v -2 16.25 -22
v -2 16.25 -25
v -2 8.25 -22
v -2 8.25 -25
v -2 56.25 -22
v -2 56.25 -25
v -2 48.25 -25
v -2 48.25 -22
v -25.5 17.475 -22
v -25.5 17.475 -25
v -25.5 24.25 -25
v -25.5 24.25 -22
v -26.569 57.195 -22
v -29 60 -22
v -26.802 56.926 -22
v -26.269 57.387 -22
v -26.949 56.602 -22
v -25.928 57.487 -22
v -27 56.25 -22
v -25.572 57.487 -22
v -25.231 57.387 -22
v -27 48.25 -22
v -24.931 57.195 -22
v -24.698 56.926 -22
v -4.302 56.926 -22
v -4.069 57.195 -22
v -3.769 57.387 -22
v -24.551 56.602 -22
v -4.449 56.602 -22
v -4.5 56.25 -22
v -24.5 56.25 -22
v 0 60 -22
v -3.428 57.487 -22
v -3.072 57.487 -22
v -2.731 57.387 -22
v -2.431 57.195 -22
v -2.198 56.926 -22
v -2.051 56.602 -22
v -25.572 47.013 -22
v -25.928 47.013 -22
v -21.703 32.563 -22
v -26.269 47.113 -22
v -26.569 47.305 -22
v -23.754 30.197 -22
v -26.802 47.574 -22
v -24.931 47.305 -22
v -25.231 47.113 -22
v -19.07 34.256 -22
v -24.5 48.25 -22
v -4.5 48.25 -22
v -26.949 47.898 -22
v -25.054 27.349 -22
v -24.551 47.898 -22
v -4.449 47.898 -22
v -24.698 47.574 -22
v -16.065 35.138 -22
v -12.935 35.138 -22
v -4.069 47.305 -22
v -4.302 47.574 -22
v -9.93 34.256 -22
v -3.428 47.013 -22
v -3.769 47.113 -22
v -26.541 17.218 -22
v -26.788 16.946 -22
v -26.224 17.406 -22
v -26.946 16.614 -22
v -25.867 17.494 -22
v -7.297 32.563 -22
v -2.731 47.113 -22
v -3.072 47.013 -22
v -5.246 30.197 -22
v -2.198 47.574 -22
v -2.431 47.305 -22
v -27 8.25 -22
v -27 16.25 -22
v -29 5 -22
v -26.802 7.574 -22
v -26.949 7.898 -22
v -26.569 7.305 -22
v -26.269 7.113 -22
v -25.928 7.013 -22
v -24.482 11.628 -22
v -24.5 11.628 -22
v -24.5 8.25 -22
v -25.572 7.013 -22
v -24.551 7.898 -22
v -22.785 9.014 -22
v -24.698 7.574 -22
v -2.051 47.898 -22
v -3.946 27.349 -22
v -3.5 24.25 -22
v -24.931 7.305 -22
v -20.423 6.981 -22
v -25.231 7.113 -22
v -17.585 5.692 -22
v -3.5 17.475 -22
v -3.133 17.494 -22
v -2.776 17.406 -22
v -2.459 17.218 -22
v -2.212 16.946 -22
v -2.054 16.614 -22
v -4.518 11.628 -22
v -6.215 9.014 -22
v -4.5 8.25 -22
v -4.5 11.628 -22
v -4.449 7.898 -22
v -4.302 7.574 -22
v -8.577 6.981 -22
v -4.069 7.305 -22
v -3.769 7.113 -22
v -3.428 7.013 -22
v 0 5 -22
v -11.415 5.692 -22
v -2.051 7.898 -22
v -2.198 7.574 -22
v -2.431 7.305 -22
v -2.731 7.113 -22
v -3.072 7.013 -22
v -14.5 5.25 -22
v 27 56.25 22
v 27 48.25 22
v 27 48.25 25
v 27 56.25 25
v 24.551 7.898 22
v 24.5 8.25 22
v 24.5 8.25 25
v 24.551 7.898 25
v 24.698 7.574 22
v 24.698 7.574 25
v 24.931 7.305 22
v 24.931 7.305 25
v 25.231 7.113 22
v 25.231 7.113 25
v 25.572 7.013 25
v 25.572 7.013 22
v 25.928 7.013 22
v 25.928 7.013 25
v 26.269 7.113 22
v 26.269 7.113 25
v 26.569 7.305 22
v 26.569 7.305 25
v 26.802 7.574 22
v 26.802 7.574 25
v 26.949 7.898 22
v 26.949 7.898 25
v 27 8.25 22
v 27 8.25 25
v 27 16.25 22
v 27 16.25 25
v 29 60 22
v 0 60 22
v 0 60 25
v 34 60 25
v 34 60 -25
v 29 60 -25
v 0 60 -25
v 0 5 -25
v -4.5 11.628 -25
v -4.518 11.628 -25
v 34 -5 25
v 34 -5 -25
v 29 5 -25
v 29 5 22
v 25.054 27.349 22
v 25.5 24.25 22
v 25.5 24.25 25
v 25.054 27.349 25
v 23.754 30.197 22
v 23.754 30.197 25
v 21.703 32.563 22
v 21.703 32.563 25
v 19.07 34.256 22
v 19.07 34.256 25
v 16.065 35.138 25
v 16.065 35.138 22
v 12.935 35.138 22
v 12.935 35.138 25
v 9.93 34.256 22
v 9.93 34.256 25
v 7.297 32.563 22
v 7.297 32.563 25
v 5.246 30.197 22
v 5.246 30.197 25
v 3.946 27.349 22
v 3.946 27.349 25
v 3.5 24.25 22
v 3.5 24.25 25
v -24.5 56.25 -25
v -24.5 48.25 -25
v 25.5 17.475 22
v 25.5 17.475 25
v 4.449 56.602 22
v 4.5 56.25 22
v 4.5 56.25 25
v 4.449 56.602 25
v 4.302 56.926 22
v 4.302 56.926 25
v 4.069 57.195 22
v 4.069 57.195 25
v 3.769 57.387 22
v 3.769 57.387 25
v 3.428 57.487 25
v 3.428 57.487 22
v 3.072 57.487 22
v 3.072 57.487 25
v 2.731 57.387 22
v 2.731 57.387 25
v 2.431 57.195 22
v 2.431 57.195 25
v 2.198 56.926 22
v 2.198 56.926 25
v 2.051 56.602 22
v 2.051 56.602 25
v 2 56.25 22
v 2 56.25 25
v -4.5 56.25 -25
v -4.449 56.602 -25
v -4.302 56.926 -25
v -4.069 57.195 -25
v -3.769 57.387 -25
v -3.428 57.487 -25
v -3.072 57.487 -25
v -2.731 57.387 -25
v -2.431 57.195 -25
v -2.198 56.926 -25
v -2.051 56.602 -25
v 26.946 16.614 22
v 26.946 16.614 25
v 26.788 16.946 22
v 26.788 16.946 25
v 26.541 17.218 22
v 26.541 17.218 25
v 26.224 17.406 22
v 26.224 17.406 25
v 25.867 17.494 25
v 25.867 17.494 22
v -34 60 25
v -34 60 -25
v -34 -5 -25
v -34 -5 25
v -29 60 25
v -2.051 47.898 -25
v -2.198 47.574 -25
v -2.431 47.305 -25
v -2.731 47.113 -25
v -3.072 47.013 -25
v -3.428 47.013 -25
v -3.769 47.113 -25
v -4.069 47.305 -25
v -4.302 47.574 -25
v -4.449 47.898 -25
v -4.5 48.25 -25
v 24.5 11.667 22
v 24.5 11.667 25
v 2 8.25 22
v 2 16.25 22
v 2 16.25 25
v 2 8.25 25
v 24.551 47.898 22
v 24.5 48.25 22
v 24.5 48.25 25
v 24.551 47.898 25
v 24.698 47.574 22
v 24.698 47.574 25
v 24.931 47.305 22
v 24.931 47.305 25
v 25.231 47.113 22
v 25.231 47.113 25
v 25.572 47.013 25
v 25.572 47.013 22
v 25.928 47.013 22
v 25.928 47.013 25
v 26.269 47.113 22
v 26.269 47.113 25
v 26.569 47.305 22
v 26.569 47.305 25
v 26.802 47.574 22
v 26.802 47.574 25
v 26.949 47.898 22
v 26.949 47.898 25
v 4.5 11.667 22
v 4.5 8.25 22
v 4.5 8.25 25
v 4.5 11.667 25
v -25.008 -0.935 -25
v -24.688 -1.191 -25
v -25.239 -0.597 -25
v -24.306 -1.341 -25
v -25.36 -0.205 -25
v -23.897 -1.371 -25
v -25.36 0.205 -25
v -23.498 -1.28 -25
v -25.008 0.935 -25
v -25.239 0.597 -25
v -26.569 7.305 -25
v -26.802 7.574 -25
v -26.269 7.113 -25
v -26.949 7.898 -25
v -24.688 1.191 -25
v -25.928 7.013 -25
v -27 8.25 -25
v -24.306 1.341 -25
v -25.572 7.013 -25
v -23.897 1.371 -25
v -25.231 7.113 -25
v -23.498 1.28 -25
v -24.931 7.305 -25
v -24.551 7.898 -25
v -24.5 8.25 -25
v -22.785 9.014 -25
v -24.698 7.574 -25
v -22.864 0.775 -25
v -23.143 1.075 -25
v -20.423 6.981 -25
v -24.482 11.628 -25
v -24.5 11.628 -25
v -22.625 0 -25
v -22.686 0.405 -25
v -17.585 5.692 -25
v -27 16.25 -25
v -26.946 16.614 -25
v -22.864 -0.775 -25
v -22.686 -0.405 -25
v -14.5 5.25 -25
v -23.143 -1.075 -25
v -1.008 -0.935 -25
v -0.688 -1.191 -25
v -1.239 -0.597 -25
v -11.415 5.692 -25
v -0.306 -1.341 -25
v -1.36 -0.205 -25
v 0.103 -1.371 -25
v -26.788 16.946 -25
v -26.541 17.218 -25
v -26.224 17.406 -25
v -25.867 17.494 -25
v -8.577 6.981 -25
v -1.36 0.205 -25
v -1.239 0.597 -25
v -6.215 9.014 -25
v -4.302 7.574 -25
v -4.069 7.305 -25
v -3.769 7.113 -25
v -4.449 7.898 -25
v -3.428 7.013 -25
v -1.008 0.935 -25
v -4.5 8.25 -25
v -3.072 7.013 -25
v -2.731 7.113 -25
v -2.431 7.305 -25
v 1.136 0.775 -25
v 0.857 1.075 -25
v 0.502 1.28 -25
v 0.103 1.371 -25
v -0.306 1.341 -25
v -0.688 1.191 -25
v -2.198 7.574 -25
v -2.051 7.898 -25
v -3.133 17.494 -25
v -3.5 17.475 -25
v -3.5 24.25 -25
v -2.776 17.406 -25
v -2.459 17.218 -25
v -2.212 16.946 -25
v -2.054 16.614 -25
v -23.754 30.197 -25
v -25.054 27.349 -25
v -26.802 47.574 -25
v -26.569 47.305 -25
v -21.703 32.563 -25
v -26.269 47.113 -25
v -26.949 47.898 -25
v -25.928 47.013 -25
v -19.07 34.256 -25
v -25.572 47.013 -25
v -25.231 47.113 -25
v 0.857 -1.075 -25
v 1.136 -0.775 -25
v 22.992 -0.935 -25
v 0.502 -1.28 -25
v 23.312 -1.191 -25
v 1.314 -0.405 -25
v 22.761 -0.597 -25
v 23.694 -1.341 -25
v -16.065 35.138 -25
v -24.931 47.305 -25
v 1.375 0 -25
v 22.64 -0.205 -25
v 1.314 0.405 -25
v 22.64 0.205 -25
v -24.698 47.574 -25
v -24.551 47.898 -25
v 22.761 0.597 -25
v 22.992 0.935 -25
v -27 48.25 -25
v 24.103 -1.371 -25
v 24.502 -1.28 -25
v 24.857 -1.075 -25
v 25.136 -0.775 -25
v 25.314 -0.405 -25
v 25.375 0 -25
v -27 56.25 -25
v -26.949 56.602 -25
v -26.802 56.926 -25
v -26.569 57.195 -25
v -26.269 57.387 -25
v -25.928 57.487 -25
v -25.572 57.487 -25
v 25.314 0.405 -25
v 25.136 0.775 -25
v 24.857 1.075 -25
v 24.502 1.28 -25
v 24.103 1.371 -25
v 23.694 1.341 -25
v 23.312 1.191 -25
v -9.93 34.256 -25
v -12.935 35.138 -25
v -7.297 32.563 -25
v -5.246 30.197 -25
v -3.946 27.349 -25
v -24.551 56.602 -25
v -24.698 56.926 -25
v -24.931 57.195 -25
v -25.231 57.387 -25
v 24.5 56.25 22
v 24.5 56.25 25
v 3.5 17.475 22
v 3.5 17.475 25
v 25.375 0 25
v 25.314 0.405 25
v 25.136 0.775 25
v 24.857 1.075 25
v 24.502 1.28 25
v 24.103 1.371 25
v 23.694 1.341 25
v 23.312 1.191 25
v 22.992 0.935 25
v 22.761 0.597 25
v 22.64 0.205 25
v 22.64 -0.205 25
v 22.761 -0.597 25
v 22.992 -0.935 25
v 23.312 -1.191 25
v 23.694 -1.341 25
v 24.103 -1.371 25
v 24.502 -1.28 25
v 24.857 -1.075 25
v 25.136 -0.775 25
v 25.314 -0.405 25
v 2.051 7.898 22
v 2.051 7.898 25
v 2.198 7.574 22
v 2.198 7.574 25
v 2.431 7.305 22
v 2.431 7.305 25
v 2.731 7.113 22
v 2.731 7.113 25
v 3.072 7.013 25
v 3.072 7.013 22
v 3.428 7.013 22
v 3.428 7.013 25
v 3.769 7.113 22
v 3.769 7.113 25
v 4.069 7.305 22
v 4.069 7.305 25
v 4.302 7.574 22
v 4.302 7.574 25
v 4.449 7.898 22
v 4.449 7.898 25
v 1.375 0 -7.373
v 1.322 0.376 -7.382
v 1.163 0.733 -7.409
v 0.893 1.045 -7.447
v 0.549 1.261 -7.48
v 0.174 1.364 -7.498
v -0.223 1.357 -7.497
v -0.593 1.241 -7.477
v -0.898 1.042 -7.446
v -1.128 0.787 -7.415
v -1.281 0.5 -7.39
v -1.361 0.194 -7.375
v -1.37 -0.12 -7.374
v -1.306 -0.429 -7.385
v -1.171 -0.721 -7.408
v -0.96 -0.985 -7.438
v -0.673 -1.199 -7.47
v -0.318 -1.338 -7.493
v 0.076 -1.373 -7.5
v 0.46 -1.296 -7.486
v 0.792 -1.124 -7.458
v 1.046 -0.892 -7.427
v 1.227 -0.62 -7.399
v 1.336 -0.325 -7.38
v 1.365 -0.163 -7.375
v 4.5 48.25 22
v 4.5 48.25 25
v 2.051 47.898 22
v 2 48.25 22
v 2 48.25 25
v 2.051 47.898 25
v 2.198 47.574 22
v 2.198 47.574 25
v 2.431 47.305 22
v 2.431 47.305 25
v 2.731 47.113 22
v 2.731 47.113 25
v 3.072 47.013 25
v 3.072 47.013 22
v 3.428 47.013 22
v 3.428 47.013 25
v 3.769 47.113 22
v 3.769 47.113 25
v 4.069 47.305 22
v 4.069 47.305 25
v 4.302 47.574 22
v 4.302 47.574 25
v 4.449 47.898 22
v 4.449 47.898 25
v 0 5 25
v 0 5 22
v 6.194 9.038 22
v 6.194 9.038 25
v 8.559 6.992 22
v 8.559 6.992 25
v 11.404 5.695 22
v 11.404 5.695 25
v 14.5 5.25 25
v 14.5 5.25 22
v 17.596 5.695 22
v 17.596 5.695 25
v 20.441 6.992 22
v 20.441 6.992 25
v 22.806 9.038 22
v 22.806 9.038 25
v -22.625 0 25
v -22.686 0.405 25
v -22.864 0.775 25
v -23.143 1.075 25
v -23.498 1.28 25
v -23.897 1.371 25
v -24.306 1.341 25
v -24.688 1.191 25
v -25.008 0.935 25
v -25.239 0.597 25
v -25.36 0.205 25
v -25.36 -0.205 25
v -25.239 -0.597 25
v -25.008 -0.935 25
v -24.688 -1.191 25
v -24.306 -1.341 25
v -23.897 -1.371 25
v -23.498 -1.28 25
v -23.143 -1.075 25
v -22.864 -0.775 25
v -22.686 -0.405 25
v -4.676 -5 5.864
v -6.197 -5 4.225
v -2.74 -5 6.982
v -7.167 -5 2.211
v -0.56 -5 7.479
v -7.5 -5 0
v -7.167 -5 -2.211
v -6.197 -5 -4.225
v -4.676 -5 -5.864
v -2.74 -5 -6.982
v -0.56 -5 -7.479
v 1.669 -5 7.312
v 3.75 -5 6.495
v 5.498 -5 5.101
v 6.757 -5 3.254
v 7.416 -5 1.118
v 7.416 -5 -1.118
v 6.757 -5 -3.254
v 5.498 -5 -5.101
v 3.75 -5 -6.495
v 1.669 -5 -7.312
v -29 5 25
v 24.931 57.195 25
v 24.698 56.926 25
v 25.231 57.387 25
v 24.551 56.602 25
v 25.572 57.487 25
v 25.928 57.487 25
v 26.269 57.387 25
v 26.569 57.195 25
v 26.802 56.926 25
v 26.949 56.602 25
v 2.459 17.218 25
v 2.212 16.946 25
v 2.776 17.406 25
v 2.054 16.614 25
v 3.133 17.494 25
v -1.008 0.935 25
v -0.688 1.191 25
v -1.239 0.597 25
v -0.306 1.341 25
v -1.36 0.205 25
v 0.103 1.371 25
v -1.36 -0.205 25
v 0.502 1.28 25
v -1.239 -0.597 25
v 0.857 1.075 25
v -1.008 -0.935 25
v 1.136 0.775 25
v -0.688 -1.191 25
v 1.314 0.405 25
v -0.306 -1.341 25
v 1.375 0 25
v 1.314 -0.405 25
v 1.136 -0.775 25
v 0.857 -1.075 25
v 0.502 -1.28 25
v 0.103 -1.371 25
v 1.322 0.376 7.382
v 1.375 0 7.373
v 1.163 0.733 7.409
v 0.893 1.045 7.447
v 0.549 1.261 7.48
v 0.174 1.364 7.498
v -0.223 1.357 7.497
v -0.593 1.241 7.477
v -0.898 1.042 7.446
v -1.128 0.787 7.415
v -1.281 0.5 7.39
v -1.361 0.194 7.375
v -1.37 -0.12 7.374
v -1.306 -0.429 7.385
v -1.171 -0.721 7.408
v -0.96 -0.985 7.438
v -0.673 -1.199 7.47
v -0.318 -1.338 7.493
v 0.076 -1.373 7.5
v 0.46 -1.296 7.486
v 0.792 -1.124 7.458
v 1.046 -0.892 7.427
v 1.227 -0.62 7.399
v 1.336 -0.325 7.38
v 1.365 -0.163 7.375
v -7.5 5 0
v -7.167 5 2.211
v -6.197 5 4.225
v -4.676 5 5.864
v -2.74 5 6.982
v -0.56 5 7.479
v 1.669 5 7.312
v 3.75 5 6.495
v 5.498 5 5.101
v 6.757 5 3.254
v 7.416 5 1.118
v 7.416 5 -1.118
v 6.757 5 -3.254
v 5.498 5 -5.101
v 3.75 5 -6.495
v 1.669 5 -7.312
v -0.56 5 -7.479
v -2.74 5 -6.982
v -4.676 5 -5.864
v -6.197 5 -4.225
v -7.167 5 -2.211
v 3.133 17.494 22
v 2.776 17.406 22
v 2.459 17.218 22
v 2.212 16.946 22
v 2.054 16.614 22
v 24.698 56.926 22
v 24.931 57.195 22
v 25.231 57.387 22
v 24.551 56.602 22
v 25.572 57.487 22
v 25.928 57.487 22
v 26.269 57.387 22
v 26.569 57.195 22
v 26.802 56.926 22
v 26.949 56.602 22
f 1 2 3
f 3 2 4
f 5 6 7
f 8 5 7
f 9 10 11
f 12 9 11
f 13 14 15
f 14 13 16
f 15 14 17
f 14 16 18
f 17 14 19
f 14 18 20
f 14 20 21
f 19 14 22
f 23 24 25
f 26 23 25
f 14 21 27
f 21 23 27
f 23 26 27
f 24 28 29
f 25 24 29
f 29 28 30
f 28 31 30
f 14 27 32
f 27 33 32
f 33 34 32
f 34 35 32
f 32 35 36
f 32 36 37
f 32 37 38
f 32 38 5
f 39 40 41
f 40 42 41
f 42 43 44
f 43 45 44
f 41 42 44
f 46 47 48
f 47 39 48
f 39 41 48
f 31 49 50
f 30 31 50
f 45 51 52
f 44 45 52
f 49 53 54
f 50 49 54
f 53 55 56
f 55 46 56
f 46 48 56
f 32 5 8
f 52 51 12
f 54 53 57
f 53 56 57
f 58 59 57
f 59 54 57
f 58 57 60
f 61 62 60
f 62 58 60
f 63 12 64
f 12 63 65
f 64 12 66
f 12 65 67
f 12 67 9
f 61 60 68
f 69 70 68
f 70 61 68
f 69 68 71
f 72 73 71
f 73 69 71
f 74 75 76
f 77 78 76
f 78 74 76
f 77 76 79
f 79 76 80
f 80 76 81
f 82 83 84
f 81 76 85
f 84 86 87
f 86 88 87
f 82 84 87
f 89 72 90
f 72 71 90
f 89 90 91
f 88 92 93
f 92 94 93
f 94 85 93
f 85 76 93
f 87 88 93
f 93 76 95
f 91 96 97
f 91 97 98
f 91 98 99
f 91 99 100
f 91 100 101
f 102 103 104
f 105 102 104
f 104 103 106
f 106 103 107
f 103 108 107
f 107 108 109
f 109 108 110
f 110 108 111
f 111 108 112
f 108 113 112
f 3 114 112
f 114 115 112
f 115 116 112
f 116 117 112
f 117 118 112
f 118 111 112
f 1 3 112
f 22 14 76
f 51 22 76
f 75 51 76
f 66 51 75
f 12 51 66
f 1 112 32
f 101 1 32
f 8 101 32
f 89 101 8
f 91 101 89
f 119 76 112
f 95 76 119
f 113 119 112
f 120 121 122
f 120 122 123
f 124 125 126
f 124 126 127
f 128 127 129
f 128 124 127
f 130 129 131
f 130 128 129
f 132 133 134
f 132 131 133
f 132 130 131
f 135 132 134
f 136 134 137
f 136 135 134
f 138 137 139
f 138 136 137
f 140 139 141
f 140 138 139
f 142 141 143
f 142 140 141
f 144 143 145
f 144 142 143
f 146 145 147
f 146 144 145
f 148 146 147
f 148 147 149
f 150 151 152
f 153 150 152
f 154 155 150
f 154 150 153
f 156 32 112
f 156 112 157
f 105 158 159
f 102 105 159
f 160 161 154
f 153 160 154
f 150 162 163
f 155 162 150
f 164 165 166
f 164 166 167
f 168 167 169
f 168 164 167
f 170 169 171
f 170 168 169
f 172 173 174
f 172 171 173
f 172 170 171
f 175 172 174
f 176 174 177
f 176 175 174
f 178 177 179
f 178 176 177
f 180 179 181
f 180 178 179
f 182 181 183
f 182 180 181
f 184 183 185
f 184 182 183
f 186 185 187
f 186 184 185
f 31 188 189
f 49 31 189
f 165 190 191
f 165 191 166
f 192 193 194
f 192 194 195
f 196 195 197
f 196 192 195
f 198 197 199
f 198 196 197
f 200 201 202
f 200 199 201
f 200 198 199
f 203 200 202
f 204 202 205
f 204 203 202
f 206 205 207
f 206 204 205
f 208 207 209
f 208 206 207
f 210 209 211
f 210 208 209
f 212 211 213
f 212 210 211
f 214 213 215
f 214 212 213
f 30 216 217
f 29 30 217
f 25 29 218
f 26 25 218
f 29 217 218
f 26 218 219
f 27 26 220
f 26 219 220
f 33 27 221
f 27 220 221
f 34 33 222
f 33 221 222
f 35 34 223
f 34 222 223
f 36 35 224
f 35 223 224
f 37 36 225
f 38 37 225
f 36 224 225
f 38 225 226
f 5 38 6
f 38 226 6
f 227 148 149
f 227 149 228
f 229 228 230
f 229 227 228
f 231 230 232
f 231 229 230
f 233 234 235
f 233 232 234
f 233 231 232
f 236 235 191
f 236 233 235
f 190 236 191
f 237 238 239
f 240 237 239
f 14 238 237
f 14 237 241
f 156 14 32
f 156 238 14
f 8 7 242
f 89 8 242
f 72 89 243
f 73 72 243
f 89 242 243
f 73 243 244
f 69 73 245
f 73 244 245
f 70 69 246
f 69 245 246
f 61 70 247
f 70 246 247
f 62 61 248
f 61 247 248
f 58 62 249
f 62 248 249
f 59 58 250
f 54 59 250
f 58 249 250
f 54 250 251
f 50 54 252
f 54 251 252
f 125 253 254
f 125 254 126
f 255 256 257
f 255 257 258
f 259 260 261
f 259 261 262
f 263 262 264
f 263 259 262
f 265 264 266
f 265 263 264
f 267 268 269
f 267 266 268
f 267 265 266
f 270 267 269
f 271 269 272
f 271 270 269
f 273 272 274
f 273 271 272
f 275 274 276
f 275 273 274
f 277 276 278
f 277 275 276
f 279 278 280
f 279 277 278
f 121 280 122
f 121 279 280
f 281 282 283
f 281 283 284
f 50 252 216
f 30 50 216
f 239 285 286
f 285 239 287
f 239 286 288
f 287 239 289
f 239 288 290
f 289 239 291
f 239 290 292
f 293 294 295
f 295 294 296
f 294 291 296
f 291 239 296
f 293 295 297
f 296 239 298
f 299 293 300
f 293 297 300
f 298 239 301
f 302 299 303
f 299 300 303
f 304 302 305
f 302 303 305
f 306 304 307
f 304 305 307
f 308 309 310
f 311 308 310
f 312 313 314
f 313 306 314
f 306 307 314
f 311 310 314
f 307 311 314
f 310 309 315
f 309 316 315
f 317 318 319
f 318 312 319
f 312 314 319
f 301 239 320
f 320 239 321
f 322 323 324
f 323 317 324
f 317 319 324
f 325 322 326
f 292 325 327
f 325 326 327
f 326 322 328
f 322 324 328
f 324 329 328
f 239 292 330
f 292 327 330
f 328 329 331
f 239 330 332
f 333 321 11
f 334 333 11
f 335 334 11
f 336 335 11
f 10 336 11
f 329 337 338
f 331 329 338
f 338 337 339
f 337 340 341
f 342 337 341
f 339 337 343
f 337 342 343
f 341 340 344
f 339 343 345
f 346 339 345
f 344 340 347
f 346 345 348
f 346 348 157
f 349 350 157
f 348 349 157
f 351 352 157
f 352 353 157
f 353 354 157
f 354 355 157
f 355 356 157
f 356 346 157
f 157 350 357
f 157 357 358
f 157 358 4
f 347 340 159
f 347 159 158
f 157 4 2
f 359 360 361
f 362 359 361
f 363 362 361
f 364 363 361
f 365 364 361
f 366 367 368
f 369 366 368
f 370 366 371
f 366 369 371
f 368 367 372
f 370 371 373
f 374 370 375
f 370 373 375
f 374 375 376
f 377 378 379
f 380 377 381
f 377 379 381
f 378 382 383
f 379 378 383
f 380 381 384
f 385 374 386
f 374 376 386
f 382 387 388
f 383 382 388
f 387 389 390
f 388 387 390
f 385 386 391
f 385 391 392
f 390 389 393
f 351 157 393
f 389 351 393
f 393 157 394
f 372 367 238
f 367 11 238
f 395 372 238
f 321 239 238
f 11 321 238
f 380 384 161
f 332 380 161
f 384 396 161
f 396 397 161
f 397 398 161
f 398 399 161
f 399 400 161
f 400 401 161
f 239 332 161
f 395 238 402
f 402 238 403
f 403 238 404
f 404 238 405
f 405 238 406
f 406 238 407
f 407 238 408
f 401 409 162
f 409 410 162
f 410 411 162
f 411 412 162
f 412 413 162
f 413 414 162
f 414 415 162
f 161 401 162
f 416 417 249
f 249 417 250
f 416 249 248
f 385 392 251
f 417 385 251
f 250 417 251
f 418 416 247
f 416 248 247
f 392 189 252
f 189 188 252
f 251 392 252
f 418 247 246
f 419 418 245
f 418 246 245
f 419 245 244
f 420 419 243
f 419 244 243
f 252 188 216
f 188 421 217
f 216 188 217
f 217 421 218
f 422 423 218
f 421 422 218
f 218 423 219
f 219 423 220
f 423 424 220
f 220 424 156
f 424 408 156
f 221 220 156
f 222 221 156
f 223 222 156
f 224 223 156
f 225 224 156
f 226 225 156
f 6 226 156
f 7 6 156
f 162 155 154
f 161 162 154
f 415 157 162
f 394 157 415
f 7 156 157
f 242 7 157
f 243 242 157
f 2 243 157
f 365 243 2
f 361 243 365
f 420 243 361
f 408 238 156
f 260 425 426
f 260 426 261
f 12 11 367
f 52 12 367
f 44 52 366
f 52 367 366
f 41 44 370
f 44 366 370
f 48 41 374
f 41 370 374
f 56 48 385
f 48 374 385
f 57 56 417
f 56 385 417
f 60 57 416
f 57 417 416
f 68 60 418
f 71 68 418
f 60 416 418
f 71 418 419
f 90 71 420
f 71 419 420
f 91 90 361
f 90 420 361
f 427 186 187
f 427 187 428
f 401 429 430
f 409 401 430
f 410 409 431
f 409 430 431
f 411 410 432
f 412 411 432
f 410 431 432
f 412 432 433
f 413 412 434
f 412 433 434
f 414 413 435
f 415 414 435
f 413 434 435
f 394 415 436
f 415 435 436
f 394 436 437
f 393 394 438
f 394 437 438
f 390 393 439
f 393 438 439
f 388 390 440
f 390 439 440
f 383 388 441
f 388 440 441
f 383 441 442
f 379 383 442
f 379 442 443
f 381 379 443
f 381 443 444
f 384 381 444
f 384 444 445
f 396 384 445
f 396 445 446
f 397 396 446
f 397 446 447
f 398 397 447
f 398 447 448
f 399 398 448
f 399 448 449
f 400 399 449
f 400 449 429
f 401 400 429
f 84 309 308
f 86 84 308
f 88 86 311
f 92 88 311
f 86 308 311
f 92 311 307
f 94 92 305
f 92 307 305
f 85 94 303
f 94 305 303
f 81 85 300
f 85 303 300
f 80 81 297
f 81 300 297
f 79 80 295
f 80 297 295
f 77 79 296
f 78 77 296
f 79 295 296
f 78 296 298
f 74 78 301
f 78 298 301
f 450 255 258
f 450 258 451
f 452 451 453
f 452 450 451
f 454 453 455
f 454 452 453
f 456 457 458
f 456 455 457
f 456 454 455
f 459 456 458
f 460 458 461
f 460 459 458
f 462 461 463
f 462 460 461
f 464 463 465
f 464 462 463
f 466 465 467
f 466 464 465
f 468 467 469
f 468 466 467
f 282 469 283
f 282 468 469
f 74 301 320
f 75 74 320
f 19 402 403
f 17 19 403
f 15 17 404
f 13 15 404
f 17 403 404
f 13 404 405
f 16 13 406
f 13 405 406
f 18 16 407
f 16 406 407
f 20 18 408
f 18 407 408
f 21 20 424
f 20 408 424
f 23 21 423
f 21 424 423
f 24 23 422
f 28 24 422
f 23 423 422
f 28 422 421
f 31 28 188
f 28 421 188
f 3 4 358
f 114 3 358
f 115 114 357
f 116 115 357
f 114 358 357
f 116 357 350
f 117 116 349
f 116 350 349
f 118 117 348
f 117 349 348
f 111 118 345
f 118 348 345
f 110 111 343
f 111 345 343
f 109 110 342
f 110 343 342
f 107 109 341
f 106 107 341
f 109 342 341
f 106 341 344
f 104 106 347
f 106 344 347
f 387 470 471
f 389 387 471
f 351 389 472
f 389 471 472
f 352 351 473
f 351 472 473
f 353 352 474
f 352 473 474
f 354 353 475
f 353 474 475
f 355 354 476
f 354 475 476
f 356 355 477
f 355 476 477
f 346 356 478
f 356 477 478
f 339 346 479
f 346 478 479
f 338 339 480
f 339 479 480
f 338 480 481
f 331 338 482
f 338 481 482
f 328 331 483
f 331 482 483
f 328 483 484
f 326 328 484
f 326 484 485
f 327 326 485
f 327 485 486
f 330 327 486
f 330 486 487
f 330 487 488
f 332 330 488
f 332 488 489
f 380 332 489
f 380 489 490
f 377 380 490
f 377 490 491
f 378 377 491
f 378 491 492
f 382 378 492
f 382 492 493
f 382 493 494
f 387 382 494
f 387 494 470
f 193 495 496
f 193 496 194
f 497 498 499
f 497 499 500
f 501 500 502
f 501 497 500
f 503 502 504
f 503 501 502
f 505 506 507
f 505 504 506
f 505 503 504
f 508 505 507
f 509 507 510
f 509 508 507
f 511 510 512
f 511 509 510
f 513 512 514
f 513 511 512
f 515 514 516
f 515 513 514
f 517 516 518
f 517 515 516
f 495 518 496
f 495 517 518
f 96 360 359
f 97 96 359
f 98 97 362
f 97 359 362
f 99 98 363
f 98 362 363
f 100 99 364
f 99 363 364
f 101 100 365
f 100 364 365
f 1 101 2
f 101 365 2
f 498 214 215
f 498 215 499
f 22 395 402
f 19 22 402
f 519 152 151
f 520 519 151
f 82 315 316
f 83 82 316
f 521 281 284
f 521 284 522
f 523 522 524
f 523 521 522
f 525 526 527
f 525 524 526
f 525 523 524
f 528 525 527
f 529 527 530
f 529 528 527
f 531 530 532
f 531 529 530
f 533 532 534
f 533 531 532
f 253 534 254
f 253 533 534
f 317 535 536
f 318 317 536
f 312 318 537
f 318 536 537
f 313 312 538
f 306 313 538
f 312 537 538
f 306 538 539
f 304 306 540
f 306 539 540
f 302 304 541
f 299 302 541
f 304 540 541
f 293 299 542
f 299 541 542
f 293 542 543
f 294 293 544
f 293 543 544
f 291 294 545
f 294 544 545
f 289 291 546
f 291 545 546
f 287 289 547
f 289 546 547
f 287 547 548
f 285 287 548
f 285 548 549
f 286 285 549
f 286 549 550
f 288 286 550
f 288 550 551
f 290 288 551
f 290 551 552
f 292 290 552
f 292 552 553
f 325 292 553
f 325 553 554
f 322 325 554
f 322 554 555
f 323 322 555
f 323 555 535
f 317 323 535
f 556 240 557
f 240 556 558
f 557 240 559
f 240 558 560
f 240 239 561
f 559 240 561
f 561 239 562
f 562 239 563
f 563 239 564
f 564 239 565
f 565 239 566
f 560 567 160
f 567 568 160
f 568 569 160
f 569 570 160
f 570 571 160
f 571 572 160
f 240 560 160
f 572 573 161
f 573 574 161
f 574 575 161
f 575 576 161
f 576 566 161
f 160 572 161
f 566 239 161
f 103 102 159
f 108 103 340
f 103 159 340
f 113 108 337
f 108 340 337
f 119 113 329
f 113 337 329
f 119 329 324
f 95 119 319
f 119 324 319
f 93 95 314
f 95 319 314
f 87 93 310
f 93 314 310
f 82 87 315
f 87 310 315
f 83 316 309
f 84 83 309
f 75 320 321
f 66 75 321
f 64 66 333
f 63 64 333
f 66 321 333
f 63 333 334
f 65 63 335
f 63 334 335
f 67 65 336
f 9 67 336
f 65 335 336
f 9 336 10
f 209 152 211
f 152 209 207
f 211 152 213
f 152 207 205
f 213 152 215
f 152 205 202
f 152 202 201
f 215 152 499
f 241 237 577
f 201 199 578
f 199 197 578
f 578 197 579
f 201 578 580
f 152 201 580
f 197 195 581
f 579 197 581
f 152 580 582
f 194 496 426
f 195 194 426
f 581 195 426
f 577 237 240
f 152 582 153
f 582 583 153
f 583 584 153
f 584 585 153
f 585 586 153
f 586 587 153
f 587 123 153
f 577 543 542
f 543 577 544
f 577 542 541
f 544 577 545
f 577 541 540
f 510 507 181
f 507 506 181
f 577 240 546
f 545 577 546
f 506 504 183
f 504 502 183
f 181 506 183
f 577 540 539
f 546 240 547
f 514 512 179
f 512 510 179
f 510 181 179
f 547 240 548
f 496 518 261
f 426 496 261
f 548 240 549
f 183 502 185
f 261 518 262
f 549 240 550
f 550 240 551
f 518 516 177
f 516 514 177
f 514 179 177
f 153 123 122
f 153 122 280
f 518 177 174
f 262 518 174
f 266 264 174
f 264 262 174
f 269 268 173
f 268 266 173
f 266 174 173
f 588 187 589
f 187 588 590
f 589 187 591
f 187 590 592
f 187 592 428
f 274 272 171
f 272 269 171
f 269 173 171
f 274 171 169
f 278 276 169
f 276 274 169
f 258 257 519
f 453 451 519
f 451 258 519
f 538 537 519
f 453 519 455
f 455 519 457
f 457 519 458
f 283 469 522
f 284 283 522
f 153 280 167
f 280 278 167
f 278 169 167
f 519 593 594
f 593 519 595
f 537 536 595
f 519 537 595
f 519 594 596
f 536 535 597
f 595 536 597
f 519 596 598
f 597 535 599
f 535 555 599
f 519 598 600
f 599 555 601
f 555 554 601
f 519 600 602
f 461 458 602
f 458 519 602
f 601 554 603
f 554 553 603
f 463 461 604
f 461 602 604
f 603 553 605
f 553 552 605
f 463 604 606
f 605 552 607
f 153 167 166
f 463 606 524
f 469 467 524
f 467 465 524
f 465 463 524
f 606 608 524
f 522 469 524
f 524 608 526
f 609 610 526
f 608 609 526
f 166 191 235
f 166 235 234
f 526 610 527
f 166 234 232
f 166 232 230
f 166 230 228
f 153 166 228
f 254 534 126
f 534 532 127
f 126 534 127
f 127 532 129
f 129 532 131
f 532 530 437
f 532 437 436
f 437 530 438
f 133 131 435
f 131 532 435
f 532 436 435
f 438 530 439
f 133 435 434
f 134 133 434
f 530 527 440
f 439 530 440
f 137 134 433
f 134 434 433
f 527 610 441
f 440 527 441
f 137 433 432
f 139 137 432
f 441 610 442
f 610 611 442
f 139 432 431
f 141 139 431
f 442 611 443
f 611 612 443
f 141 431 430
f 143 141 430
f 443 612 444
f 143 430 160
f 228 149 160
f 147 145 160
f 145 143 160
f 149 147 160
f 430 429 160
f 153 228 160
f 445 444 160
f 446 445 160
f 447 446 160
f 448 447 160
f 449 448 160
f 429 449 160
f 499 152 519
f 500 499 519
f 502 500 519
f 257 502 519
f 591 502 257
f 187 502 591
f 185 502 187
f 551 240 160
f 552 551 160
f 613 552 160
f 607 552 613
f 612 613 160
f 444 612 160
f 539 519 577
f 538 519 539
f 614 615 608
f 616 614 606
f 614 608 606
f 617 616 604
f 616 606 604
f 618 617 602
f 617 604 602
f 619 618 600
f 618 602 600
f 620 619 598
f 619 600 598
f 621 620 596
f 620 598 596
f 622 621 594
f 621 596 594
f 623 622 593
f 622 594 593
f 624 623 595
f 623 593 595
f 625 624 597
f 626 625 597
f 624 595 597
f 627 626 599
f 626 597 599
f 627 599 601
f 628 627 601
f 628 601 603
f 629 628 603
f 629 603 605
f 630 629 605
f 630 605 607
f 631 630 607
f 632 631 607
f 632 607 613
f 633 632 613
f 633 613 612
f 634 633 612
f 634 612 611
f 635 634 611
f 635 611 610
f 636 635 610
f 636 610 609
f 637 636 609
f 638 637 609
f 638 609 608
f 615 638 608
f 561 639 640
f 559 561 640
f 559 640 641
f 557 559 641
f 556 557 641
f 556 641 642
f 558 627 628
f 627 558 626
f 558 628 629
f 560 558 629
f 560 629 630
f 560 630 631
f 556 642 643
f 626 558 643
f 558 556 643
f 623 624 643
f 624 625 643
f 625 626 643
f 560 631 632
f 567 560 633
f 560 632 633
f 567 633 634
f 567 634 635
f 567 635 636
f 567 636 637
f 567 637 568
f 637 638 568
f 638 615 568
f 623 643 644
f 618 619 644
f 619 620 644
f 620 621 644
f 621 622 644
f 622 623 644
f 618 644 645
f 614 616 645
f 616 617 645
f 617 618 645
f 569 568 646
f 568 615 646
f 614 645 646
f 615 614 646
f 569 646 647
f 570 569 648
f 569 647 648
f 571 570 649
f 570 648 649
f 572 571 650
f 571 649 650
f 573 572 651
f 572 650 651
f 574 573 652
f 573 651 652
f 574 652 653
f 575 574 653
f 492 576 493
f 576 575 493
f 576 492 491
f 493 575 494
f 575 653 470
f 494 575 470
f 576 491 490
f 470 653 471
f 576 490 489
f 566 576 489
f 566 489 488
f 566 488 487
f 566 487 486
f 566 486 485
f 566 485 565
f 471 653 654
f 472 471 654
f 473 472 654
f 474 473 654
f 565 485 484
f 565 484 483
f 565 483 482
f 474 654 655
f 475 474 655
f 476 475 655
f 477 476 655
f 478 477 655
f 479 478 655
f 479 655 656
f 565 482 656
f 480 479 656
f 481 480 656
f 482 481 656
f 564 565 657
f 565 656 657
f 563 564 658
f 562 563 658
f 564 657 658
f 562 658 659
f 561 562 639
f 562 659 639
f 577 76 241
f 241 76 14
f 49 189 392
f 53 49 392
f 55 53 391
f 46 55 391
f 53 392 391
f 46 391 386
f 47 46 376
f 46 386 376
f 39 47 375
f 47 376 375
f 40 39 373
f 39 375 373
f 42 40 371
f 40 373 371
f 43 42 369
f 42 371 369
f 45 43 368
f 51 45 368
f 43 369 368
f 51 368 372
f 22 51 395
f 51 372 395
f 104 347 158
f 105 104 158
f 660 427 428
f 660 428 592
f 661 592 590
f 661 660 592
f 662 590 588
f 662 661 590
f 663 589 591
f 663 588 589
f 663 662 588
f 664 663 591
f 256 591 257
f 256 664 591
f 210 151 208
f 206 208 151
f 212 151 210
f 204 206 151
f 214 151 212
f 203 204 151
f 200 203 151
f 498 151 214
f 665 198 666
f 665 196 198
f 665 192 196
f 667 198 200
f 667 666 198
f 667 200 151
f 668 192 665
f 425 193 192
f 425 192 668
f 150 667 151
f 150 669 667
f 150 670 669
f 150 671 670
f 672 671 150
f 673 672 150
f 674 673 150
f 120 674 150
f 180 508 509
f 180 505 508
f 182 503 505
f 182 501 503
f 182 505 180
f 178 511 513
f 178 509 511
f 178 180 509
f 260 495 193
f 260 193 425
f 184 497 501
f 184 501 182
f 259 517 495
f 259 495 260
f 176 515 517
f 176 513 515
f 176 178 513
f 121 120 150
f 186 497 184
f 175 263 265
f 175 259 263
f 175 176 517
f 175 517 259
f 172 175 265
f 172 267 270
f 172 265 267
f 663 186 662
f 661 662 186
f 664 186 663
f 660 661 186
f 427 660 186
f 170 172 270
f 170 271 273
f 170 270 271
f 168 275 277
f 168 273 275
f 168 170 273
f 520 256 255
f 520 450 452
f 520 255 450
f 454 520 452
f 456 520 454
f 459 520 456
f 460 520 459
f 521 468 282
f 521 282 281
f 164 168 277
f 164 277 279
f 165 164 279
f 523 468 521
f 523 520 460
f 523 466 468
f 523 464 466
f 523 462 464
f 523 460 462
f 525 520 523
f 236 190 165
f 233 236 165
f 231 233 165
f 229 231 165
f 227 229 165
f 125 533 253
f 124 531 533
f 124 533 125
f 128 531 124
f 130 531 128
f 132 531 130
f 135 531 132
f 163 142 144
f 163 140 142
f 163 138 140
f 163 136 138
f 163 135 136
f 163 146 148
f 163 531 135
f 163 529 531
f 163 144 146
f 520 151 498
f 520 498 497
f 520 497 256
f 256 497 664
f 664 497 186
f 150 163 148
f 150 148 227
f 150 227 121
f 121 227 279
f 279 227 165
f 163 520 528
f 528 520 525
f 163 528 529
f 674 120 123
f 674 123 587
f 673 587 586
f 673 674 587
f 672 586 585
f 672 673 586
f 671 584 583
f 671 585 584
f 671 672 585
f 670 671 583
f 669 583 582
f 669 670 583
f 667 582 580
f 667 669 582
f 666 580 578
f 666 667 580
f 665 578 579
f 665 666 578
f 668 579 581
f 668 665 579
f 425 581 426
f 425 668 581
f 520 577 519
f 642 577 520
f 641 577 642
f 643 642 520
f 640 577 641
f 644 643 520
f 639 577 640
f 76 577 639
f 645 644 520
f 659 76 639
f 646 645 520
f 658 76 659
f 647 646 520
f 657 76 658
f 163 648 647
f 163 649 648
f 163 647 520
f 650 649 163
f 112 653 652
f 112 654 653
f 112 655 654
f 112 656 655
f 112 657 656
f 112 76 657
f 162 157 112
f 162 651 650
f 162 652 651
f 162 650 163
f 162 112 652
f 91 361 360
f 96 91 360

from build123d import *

# Parameters (mm, degrees)
BOSS_EXTRUDE1_DEPTH      = 25
BOSS_EXTRUDE1_DEPTH_BACK = 25
SKETCH1_W                = 5
SKETCH1_H                = 55
SKETCH1_W_2              = 68
SKETCH1_H_2              = 10
SKETCH2_W                = 29
SKETCH2_H                = 3
BOSS_EXTRUDE2_DEPTH      = 55
SKETCH4_R                = 7.5
CUT_EXTRUDE2_DEPTH       = 12
SKETCH6_R                = 1.375
CUT_EXTRUDE4_DEPTH       = 70
CUT_EXTRUDE11_DEPTH      = 61
SKETCH9_W                = 22
SKETCH9_H                = 5.846779426
CUT_EXTRUDE12_DEPTH      = 70


with BuildPart() as part:
    # Sketch1 → Boss-Extrude1 (new, two sides: drawn at the far end of the back side and taken through both)
    with BuildSketch(Plane.XY.offset(-BOSS_EXTRUDE1_DEPTH_BACK)):
        with Locations((-31.5, 32.5)):
            Rectangle(SKETCH1_W, SKETCH1_H)
        Rectangle(SKETCH1_W_2, SKETCH1_H_2)
        with Locations((31.5, 32.5)):
            Rectangle(SKETCH1_W, SKETCH1_H)
    extrude(amount=BOSS_EXTRUDE1_DEPTH + BOSS_EXTRUDE1_DEPTH_BACK)

    # Sketch2 → Boss-Extrude2 (add)
    with BuildSketch(Plane(origin=(0, 5, 0), x_dir=(1, 0, 0), z_dir=(0, 1, 0))):
        with Locations((14.5, -23.5)):
            Rectangle(SKETCH2_W, SKETCH2_H)
        with Locations((-14.5, 23.5)):
            Rectangle(SKETCH2_W, SKETCH2_H)
    extrude(amount=BOSS_EXTRUDE2_DEPTH)

    # Sketch4 → Cut-Extrude2 (cut)
    with BuildSketch(Plane(origin=(0, 5, 0), x_dir=(1, 0, 0), z_dir=(0, 1, 0))):
        with Locations(Location((0, 0, 0), (0, 0, 180))):
            Circle(SKETCH4_R)
    extrude(amount=-CUT_EXTRUDE2_DEPTH, mode=Mode.SUBTRACT)

    # Sketch6 → Cut-Extrude4 (cut)
    with BuildSketch(Plane.XY.offset(25)):
        Circle(SKETCH6_R)
        with Locations((24, 0)):
            Circle(SKETCH6_R)
        with Locations((-24, 0)):
            Circle(SKETCH6_R)
    extrude(amount=-CUT_EXTRUDE4_DEPTH, mode=Mode.SUBTRACT)

    # Sketch3 → Cut-Extrude11 (cut)
    with BuildSketch(Plane(origin=(0, 0, -25), x_dir=(-1, 0, 0), z_dir=(0, 0, -1))):
        with BuildLine():
            Line((25.5, 17.474744871), (25.5, 24.25))
            ThreePointArc((25.5, 24.25), (14.5, 35.25), (3.5, 24.25))
            Line((3.5, 24.25), (3.5, 17.474744871))
            ThreePointArc((3.5, 17.474744871), (2.459430585, 17.218245837), (2, 16.25))
            Line((2, 16.25), (2, 8.25))
            ThreePointArc((2, 8.25), (3.25, 7), (4.5, 8.25))
            Line((4.5, 8.25), (4.5, 11.667424305))
            ThreePointArc((4.5, 11.667424305), (14.5, 5.25), (24.5, 11.667424305))
            Line((24.5, 11.667424305), (24.5, 8.25))
            ThreePointArc((24.5, 8.25), (25.75, 7), (27, 8.25))
            Line((27, 8.25), (27, 16.25))
            ThreePointArc((27, 16.25), (26.540569415, 17.218245837), (25.5, 17.474744871))
        make_face()
        with BuildLine():
            Line((4.5, 48.25), (4.5, 56.25))
            ThreePointArc((4.5, 56.25), (3.25, 57.5), (2, 56.25))
            Line((2, 56.25), (2, 48.25))
            ThreePointArc((2, 48.25), (3.25, 47), (4.5, 48.25))
        make_face()
        with BuildLine():
            Line((27, 48.25), (27, 56.25))
            ThreePointArc((27, 56.25), (25.75, 57.5), (24.5, 56.25))
            Line((24.5, 56.25), (24.5, 48.25))
            ThreePointArc((24.5, 48.25), (25.75, 47), (27, 48.25))
        make_face()
    cut_extrude11 = extrude(amount=-CUT_EXTRUDE11_DEPTH, mode=Mode.SUBTRACT)

    # Sketch9 → Cut-Extrude12 (cut)
    with BuildSketch(Plane(origin=(0, 0, -25), x_dir=(-1, 0, 0), z_dir=(0, 0, -1))):
        with Locations((14.5, 14.551355158)):
            Rectangle(SKETCH9_W, SKETCH9_H)
    extrude(amount=-CUT_EXTRUDE12_DEPTH, mode=Mode.SUBTRACT)

    # Mirror3: Cut-Extrude11 across plane
    add(cut_extrude11.mirror(Plane(origin=(0, 0, 0), x_dir=(0, 0, 1), z_dir=(1, 0, 0))), mode=Mode.SUBTRACT)


solid = part.part
